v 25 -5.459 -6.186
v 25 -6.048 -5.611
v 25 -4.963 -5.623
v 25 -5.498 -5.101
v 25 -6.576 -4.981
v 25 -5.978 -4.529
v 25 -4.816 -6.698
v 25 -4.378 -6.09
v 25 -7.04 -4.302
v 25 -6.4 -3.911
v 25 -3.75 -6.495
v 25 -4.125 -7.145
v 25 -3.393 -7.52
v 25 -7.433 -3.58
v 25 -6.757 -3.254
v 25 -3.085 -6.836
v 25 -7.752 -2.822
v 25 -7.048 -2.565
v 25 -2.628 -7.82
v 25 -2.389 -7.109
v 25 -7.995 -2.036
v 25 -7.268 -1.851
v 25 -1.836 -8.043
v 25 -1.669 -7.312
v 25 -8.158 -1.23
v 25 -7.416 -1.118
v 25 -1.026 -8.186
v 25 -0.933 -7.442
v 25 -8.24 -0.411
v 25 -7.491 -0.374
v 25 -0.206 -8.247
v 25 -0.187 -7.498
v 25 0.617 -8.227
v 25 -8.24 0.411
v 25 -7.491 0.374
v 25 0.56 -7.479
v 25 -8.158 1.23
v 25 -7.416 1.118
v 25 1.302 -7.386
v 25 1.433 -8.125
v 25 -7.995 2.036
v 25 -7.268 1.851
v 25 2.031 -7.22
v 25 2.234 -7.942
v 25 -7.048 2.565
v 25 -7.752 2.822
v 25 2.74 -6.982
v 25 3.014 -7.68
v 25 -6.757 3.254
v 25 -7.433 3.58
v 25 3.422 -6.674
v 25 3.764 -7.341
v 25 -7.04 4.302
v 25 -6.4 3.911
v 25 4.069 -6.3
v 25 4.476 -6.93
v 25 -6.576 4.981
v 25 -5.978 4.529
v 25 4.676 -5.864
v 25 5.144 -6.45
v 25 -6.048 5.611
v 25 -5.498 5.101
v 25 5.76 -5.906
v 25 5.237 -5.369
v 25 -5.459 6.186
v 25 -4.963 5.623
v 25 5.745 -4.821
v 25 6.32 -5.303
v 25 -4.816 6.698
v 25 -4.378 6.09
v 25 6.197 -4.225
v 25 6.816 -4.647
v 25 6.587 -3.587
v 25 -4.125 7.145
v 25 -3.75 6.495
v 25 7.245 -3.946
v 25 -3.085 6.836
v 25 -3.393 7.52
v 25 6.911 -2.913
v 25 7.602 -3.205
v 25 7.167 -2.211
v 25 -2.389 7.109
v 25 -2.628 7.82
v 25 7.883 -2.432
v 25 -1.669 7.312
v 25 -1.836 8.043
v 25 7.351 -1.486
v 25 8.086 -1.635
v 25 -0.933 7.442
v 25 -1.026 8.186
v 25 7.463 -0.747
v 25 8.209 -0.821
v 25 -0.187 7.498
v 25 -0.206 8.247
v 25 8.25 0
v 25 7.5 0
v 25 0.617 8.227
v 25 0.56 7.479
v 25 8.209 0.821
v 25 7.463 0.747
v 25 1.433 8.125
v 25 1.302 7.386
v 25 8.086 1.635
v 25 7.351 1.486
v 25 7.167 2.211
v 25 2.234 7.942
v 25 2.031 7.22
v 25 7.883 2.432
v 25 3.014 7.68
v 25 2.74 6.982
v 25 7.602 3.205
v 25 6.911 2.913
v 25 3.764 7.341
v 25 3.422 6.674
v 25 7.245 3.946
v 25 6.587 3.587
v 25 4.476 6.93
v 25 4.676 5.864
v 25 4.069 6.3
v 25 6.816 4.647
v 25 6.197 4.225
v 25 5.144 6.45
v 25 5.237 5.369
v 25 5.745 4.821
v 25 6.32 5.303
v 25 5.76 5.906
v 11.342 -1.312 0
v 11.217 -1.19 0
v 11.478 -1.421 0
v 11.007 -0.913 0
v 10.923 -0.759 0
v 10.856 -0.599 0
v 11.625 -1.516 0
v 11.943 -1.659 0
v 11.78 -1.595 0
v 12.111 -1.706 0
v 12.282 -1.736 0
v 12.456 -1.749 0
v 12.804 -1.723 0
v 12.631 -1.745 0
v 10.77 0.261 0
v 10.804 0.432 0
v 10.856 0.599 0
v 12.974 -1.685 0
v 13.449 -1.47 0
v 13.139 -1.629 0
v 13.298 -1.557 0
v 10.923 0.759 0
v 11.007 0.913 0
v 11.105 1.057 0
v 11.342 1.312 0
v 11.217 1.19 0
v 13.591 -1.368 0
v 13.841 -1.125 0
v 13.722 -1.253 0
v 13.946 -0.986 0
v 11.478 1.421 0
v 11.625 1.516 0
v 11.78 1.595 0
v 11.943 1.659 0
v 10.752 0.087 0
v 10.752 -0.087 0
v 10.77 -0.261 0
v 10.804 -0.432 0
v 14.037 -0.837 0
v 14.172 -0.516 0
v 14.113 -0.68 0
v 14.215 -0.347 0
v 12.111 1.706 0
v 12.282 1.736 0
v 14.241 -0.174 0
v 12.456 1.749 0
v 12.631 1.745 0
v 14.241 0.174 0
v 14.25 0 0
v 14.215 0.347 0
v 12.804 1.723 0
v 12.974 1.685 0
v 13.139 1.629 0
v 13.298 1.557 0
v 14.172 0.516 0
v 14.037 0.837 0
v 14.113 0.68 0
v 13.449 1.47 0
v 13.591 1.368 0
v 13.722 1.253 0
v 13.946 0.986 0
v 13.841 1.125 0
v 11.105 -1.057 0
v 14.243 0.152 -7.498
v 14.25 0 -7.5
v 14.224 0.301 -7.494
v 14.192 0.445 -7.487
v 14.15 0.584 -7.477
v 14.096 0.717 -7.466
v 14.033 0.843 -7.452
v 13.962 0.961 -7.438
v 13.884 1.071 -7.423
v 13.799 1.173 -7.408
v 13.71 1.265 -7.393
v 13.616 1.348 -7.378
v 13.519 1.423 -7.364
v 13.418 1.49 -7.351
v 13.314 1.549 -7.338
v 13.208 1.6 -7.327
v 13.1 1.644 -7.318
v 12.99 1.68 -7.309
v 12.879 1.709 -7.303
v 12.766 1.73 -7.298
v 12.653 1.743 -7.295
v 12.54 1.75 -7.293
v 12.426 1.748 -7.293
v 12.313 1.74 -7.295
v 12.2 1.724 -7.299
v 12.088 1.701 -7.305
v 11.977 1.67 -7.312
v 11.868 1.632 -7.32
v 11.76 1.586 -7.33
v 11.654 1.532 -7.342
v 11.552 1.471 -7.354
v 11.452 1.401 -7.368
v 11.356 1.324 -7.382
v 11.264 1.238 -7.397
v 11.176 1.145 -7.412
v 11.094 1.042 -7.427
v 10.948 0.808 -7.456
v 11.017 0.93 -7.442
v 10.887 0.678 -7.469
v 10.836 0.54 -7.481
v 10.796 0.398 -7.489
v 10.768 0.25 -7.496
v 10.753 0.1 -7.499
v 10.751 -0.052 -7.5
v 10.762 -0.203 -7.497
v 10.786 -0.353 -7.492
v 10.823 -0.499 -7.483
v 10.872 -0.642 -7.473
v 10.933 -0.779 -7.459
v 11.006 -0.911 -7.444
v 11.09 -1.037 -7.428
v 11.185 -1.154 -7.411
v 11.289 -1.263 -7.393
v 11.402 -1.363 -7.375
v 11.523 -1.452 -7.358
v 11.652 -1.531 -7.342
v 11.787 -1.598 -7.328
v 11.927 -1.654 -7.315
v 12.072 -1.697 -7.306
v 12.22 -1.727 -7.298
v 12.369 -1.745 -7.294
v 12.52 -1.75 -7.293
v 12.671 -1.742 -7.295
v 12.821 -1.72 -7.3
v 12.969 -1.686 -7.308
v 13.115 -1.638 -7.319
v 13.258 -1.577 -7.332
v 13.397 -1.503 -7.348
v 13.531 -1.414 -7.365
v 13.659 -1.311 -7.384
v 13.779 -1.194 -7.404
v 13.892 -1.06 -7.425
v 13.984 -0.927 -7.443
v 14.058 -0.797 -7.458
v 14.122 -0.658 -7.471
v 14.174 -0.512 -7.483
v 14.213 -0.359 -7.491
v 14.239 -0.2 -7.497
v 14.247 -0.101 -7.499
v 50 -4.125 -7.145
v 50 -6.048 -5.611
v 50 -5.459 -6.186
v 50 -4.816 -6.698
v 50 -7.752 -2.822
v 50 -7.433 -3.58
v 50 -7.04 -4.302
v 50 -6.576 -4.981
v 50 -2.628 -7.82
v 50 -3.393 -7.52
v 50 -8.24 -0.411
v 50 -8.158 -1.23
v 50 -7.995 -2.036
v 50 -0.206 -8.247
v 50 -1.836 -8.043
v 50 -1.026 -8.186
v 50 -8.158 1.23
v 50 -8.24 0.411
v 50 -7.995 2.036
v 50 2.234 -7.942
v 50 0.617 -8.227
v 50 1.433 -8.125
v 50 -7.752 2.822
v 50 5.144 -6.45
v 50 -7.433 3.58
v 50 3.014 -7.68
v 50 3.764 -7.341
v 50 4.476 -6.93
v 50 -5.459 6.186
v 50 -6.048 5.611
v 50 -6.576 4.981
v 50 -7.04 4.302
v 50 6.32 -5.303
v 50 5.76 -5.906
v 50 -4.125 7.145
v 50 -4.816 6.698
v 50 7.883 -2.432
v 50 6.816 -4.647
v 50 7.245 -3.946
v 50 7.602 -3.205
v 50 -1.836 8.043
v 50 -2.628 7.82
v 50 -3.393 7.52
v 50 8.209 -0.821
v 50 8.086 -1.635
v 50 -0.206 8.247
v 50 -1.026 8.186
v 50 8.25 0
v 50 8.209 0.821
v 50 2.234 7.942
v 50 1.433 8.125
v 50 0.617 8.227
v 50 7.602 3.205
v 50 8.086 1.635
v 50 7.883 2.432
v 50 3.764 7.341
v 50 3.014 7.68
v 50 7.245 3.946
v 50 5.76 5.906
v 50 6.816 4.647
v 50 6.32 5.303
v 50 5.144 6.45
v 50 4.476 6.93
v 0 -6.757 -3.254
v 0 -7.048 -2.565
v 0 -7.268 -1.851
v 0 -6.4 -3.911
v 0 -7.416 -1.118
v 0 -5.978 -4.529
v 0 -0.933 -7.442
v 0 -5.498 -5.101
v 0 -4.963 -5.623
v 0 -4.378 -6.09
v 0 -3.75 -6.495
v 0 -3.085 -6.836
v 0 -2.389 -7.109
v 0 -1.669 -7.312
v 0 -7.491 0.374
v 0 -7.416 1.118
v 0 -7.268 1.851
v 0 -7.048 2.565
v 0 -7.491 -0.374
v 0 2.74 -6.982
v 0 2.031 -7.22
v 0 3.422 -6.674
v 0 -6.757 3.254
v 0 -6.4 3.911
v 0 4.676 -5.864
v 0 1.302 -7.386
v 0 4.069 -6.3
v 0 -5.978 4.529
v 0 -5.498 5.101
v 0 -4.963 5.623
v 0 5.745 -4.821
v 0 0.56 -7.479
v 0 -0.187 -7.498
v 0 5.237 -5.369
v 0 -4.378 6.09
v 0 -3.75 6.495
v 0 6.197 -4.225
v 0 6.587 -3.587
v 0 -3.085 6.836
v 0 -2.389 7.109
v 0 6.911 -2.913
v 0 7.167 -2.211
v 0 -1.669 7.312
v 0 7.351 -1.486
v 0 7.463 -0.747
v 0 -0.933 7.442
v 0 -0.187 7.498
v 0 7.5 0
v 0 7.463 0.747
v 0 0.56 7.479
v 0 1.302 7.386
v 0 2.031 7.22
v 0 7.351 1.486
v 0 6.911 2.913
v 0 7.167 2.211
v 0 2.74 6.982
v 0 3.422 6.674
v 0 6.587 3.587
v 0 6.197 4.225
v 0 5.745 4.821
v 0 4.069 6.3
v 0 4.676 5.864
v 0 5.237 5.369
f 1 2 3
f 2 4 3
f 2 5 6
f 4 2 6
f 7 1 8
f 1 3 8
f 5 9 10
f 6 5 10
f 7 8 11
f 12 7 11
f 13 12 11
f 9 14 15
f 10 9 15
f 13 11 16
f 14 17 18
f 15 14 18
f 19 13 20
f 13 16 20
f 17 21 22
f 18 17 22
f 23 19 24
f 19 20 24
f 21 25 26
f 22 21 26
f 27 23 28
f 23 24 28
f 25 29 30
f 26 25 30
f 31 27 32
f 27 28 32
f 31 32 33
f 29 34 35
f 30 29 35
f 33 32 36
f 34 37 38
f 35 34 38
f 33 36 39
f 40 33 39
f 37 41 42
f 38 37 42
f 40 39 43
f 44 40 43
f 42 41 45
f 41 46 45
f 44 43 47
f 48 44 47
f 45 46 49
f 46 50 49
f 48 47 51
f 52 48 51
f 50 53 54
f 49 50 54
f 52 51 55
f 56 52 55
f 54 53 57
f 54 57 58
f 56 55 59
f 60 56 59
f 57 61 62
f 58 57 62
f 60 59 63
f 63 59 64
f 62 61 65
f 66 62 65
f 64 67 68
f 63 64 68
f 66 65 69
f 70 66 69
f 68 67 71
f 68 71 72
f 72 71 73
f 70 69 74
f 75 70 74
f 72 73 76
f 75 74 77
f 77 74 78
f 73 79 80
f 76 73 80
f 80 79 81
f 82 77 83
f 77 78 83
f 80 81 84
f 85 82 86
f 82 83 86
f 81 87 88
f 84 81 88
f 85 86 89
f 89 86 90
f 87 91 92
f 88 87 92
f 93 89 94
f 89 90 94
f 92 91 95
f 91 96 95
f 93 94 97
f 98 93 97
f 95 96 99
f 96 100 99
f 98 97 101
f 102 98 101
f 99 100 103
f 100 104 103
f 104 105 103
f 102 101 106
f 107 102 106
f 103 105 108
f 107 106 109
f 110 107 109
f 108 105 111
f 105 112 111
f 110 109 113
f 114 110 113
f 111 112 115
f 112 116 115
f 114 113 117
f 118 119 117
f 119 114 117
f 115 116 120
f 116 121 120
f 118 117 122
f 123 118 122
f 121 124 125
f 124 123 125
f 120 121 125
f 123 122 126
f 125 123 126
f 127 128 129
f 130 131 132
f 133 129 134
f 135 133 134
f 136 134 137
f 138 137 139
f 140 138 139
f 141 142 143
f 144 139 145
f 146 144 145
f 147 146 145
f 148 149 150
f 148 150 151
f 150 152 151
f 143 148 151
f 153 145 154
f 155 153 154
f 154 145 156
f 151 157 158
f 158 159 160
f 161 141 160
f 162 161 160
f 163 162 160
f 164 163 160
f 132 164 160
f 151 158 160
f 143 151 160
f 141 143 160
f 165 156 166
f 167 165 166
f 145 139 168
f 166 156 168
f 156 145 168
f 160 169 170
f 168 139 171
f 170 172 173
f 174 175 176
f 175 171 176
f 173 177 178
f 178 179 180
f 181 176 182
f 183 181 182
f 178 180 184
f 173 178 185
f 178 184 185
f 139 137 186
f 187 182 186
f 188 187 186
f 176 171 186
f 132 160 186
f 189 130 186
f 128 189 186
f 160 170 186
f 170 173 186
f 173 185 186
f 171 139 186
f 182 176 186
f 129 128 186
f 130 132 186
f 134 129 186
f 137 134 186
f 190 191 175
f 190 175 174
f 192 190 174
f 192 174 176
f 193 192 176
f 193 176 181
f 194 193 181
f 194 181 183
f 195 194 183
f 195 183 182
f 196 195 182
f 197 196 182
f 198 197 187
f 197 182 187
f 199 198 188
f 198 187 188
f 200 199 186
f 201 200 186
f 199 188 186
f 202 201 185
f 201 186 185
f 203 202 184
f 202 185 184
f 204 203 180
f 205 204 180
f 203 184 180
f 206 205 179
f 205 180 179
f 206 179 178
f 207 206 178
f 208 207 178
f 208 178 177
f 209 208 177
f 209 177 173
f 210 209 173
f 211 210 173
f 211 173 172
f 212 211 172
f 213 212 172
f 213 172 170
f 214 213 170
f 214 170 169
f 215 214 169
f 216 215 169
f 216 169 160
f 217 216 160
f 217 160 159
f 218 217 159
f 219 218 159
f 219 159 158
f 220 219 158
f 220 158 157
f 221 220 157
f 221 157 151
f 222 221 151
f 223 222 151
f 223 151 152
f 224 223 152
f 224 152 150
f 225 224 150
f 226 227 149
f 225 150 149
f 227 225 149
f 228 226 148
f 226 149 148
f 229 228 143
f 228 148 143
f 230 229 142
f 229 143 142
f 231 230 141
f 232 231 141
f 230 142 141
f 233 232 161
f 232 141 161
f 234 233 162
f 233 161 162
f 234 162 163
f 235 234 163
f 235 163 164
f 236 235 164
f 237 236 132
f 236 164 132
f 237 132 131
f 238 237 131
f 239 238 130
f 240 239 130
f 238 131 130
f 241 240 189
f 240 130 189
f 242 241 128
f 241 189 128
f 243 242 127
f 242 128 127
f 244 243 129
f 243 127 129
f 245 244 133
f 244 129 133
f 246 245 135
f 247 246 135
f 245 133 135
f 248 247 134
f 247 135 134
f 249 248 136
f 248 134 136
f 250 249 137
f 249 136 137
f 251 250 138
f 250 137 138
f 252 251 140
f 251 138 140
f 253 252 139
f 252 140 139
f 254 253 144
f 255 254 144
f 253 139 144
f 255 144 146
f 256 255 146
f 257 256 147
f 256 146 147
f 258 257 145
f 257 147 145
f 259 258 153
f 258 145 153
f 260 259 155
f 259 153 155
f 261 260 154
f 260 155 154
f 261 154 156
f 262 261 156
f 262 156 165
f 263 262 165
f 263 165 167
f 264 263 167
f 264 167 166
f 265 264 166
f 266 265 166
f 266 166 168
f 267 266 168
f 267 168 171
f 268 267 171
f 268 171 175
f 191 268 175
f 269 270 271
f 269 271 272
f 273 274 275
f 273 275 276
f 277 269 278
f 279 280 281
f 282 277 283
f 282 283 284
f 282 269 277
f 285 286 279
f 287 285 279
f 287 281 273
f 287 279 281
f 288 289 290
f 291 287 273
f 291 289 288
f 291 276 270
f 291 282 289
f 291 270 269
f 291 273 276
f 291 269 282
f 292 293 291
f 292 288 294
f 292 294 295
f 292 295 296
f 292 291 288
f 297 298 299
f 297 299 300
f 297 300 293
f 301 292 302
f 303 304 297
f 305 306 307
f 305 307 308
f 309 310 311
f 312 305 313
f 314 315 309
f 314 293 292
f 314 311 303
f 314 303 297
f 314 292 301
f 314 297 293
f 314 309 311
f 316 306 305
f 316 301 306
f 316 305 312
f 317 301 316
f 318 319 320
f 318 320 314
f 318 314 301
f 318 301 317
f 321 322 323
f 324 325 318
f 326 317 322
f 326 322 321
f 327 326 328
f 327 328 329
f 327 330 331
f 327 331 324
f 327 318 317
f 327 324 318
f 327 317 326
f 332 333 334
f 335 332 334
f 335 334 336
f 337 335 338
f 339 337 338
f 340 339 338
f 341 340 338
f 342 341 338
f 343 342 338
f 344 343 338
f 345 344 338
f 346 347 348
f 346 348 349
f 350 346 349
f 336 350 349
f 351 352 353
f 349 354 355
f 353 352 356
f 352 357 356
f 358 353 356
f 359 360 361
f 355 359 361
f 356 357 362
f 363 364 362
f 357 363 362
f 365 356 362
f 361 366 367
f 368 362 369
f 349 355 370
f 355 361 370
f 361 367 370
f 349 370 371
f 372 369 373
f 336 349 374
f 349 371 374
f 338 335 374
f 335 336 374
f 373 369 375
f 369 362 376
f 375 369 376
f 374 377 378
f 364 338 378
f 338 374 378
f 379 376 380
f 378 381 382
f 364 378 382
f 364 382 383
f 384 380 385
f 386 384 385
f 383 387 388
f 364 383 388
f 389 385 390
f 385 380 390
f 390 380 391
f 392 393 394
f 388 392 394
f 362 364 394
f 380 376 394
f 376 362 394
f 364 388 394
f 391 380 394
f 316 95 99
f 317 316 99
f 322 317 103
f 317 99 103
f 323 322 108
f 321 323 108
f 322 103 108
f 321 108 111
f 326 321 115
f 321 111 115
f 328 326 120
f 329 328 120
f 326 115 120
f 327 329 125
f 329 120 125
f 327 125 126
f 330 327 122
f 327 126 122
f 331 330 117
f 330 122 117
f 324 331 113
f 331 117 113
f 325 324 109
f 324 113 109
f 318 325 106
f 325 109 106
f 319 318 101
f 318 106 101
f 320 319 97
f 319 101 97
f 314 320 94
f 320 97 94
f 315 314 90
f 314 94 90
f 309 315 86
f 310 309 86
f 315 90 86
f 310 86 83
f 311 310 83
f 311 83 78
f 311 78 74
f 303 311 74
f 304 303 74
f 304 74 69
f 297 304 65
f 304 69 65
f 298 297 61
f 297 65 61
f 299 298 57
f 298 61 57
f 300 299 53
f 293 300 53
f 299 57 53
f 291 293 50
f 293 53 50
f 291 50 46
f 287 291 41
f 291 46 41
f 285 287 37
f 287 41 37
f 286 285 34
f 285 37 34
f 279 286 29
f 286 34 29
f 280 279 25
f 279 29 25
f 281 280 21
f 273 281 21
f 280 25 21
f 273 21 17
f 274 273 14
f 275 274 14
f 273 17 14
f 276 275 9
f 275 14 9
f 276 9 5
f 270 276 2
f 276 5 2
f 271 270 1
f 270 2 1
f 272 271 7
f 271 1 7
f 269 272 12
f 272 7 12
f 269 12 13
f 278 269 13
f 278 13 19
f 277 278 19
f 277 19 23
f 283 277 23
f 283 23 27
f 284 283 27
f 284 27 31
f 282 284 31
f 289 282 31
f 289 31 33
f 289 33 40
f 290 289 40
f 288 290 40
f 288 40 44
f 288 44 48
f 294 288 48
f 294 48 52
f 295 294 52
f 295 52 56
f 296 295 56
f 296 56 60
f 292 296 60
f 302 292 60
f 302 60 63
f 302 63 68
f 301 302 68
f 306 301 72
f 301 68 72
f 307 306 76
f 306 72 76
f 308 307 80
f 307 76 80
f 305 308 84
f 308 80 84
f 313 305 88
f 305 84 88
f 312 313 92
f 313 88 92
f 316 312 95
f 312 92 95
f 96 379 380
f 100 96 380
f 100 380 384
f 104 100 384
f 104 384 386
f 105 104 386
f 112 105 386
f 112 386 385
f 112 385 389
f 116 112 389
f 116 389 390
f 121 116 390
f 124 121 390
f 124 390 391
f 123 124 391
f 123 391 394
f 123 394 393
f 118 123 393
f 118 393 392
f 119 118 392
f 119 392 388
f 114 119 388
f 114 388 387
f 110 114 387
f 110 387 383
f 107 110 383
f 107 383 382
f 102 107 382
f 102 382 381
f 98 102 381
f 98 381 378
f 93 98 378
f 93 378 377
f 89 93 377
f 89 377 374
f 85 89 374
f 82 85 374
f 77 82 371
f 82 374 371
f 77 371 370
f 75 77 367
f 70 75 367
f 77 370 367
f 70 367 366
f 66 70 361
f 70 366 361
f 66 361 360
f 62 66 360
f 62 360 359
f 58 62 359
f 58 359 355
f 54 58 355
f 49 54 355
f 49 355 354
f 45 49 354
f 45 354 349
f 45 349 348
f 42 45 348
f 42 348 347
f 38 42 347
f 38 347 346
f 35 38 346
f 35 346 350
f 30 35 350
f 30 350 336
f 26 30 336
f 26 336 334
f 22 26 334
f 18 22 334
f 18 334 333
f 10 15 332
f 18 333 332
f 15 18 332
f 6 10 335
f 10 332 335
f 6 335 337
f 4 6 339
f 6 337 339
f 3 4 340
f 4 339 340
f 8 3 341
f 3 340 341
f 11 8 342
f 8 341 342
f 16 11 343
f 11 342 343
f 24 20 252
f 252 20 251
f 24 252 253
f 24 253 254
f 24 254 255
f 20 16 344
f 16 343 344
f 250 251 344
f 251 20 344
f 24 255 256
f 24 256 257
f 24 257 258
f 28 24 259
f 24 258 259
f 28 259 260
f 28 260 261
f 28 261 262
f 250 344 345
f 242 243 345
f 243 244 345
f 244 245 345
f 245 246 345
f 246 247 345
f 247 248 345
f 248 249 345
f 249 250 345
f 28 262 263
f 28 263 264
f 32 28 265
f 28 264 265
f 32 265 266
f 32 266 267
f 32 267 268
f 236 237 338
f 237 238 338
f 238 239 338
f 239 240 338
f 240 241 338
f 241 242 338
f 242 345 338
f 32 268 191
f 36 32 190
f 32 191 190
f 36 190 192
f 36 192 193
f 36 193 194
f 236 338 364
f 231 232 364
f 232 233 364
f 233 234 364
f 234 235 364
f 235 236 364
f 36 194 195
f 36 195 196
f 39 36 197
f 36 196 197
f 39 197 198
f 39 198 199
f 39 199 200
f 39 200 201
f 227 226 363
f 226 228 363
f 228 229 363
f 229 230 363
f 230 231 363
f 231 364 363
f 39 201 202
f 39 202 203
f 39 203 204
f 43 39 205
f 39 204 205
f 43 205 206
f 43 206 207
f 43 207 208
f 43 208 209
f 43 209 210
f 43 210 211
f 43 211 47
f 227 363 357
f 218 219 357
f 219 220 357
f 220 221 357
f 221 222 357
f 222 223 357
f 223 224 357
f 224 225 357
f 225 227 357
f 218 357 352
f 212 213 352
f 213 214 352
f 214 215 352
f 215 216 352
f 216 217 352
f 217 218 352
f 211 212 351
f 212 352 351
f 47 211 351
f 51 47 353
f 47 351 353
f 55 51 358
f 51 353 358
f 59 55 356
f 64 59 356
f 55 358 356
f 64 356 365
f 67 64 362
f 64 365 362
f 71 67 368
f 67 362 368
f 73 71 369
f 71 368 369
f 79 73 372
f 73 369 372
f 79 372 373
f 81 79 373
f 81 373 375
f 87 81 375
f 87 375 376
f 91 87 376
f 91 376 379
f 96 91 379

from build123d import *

# Parameters (mm, degrees)
F0_R     = 7.5
F1_DEPTH = 25
F2_R     = 8.25
F3_DEPTH = 25
F4_R     = 1.75
F5_DEPTH = 25


with BuildPart() as f1:
    # F0 (on Right) → F1 (new body)
    with BuildSketch(Plane.YZ):
        Circle(F0_R)
    extrude(amount=F1_DEPTH)

    # F2 (on face) → F3 (join)
    with BuildSketch(Plane.YZ.offset(25)):
        Circle(F2_R)
    extrude(amount=F3_DEPTH)

    # F4 (on Top) → F5 (cut)
    with BuildSketch(Plane.XY):
        with Locations((12.5, 0)):
            Circle(F4_R)
    extrude(amount=-F5_DEPTH, mode=Mode.SUBTRACT)


solid = f1.part
